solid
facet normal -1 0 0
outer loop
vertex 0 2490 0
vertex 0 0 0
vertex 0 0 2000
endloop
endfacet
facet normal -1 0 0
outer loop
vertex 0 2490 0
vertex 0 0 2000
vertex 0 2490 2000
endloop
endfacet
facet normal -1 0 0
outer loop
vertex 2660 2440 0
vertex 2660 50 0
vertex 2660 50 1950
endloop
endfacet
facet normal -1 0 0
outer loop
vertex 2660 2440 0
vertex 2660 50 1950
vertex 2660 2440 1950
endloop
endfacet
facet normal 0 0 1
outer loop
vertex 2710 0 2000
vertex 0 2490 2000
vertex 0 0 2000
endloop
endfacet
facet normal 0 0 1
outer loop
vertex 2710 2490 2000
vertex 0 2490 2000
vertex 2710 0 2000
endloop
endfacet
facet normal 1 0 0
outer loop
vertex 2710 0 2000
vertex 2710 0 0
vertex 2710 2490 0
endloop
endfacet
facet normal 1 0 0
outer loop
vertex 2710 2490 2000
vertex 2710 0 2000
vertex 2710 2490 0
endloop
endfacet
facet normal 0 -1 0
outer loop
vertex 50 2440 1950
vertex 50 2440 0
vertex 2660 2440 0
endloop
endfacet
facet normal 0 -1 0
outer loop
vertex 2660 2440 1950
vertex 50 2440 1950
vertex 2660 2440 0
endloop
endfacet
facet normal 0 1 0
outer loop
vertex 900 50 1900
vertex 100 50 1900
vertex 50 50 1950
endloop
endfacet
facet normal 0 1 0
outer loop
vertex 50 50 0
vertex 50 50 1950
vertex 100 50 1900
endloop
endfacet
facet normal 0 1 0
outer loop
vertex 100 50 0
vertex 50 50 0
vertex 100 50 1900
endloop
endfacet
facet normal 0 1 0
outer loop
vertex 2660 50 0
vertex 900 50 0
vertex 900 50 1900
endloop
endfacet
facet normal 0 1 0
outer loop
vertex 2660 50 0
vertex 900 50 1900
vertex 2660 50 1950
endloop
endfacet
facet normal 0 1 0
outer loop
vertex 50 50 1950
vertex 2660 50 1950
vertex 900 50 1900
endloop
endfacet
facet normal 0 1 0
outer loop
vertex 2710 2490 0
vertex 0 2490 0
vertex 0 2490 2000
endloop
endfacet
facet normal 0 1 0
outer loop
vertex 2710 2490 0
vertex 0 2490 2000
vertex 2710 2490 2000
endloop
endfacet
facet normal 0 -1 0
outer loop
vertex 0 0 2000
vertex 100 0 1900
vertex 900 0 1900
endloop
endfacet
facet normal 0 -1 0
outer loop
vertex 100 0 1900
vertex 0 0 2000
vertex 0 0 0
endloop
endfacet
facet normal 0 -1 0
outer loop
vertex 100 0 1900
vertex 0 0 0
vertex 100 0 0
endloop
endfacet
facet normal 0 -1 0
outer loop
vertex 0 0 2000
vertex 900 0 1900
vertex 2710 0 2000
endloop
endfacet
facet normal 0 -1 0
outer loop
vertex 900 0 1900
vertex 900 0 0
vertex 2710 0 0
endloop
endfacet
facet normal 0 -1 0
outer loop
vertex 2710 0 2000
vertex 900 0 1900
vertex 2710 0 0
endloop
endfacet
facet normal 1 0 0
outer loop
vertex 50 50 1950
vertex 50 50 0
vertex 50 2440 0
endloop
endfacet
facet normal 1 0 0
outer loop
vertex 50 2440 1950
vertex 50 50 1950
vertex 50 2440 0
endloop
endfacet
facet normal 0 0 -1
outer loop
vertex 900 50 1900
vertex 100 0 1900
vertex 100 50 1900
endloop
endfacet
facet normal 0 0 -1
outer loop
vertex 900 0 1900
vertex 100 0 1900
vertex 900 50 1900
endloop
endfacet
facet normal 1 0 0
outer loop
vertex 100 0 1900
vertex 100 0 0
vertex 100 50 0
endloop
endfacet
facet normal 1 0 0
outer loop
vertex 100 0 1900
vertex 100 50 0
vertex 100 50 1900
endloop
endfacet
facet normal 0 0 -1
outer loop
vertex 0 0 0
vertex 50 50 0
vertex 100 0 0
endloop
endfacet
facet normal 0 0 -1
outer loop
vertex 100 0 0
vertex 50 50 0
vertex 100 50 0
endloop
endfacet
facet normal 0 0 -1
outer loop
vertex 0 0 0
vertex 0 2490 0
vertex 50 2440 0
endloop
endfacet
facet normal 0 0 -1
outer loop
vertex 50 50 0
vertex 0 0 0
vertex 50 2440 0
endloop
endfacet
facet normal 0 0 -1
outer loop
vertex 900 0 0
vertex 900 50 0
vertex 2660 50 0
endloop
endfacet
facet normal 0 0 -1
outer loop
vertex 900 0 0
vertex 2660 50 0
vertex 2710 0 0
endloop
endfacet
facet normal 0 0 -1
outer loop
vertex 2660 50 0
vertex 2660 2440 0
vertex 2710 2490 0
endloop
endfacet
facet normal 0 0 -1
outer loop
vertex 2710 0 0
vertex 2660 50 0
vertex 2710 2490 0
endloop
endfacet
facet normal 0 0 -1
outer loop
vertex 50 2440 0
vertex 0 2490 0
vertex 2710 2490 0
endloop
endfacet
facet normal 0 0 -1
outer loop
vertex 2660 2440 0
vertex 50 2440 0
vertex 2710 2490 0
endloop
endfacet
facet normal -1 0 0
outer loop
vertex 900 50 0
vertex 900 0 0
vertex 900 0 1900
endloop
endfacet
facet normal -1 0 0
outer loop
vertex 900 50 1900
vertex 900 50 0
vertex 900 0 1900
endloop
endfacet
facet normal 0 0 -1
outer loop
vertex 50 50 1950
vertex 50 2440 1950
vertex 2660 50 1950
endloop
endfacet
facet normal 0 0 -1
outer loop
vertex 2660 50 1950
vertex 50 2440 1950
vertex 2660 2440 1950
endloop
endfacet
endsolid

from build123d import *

# Parameters (mm, degrees)
F0_W     = 2710
F0_H     = 2490
F1_DEPTH = 2000
F2_T     = -50
F3_W     = 800
F3_H     = 1900
F4_DEPTH = 50


with BuildPart() as f1:
    # F0 (on Top) → F1 (new body)
    with BuildSketch(Plane.XY):
        with Locations((1355, 1245)):
            Rectangle(F0_W, F0_H)
    extrude(amount=F1_DEPTH)

    # F2
    f2_openings = [f1.faces().sort_by_distance(p)[0] for p in [
        (1355, 1245, 0),
    ]]
    offset(amount=F2_T, openings=f2_openings)

    # F3 (on face) → F4 (cut, through all)
    with BuildSketch(Plane.XZ):
        with Locations((500, 950)):
            Rectangle(F3_W, F3_H)
    extrude(amount=-F4_DEPTH, mode=Mode.SUBTRACT)


solid = f1.part
